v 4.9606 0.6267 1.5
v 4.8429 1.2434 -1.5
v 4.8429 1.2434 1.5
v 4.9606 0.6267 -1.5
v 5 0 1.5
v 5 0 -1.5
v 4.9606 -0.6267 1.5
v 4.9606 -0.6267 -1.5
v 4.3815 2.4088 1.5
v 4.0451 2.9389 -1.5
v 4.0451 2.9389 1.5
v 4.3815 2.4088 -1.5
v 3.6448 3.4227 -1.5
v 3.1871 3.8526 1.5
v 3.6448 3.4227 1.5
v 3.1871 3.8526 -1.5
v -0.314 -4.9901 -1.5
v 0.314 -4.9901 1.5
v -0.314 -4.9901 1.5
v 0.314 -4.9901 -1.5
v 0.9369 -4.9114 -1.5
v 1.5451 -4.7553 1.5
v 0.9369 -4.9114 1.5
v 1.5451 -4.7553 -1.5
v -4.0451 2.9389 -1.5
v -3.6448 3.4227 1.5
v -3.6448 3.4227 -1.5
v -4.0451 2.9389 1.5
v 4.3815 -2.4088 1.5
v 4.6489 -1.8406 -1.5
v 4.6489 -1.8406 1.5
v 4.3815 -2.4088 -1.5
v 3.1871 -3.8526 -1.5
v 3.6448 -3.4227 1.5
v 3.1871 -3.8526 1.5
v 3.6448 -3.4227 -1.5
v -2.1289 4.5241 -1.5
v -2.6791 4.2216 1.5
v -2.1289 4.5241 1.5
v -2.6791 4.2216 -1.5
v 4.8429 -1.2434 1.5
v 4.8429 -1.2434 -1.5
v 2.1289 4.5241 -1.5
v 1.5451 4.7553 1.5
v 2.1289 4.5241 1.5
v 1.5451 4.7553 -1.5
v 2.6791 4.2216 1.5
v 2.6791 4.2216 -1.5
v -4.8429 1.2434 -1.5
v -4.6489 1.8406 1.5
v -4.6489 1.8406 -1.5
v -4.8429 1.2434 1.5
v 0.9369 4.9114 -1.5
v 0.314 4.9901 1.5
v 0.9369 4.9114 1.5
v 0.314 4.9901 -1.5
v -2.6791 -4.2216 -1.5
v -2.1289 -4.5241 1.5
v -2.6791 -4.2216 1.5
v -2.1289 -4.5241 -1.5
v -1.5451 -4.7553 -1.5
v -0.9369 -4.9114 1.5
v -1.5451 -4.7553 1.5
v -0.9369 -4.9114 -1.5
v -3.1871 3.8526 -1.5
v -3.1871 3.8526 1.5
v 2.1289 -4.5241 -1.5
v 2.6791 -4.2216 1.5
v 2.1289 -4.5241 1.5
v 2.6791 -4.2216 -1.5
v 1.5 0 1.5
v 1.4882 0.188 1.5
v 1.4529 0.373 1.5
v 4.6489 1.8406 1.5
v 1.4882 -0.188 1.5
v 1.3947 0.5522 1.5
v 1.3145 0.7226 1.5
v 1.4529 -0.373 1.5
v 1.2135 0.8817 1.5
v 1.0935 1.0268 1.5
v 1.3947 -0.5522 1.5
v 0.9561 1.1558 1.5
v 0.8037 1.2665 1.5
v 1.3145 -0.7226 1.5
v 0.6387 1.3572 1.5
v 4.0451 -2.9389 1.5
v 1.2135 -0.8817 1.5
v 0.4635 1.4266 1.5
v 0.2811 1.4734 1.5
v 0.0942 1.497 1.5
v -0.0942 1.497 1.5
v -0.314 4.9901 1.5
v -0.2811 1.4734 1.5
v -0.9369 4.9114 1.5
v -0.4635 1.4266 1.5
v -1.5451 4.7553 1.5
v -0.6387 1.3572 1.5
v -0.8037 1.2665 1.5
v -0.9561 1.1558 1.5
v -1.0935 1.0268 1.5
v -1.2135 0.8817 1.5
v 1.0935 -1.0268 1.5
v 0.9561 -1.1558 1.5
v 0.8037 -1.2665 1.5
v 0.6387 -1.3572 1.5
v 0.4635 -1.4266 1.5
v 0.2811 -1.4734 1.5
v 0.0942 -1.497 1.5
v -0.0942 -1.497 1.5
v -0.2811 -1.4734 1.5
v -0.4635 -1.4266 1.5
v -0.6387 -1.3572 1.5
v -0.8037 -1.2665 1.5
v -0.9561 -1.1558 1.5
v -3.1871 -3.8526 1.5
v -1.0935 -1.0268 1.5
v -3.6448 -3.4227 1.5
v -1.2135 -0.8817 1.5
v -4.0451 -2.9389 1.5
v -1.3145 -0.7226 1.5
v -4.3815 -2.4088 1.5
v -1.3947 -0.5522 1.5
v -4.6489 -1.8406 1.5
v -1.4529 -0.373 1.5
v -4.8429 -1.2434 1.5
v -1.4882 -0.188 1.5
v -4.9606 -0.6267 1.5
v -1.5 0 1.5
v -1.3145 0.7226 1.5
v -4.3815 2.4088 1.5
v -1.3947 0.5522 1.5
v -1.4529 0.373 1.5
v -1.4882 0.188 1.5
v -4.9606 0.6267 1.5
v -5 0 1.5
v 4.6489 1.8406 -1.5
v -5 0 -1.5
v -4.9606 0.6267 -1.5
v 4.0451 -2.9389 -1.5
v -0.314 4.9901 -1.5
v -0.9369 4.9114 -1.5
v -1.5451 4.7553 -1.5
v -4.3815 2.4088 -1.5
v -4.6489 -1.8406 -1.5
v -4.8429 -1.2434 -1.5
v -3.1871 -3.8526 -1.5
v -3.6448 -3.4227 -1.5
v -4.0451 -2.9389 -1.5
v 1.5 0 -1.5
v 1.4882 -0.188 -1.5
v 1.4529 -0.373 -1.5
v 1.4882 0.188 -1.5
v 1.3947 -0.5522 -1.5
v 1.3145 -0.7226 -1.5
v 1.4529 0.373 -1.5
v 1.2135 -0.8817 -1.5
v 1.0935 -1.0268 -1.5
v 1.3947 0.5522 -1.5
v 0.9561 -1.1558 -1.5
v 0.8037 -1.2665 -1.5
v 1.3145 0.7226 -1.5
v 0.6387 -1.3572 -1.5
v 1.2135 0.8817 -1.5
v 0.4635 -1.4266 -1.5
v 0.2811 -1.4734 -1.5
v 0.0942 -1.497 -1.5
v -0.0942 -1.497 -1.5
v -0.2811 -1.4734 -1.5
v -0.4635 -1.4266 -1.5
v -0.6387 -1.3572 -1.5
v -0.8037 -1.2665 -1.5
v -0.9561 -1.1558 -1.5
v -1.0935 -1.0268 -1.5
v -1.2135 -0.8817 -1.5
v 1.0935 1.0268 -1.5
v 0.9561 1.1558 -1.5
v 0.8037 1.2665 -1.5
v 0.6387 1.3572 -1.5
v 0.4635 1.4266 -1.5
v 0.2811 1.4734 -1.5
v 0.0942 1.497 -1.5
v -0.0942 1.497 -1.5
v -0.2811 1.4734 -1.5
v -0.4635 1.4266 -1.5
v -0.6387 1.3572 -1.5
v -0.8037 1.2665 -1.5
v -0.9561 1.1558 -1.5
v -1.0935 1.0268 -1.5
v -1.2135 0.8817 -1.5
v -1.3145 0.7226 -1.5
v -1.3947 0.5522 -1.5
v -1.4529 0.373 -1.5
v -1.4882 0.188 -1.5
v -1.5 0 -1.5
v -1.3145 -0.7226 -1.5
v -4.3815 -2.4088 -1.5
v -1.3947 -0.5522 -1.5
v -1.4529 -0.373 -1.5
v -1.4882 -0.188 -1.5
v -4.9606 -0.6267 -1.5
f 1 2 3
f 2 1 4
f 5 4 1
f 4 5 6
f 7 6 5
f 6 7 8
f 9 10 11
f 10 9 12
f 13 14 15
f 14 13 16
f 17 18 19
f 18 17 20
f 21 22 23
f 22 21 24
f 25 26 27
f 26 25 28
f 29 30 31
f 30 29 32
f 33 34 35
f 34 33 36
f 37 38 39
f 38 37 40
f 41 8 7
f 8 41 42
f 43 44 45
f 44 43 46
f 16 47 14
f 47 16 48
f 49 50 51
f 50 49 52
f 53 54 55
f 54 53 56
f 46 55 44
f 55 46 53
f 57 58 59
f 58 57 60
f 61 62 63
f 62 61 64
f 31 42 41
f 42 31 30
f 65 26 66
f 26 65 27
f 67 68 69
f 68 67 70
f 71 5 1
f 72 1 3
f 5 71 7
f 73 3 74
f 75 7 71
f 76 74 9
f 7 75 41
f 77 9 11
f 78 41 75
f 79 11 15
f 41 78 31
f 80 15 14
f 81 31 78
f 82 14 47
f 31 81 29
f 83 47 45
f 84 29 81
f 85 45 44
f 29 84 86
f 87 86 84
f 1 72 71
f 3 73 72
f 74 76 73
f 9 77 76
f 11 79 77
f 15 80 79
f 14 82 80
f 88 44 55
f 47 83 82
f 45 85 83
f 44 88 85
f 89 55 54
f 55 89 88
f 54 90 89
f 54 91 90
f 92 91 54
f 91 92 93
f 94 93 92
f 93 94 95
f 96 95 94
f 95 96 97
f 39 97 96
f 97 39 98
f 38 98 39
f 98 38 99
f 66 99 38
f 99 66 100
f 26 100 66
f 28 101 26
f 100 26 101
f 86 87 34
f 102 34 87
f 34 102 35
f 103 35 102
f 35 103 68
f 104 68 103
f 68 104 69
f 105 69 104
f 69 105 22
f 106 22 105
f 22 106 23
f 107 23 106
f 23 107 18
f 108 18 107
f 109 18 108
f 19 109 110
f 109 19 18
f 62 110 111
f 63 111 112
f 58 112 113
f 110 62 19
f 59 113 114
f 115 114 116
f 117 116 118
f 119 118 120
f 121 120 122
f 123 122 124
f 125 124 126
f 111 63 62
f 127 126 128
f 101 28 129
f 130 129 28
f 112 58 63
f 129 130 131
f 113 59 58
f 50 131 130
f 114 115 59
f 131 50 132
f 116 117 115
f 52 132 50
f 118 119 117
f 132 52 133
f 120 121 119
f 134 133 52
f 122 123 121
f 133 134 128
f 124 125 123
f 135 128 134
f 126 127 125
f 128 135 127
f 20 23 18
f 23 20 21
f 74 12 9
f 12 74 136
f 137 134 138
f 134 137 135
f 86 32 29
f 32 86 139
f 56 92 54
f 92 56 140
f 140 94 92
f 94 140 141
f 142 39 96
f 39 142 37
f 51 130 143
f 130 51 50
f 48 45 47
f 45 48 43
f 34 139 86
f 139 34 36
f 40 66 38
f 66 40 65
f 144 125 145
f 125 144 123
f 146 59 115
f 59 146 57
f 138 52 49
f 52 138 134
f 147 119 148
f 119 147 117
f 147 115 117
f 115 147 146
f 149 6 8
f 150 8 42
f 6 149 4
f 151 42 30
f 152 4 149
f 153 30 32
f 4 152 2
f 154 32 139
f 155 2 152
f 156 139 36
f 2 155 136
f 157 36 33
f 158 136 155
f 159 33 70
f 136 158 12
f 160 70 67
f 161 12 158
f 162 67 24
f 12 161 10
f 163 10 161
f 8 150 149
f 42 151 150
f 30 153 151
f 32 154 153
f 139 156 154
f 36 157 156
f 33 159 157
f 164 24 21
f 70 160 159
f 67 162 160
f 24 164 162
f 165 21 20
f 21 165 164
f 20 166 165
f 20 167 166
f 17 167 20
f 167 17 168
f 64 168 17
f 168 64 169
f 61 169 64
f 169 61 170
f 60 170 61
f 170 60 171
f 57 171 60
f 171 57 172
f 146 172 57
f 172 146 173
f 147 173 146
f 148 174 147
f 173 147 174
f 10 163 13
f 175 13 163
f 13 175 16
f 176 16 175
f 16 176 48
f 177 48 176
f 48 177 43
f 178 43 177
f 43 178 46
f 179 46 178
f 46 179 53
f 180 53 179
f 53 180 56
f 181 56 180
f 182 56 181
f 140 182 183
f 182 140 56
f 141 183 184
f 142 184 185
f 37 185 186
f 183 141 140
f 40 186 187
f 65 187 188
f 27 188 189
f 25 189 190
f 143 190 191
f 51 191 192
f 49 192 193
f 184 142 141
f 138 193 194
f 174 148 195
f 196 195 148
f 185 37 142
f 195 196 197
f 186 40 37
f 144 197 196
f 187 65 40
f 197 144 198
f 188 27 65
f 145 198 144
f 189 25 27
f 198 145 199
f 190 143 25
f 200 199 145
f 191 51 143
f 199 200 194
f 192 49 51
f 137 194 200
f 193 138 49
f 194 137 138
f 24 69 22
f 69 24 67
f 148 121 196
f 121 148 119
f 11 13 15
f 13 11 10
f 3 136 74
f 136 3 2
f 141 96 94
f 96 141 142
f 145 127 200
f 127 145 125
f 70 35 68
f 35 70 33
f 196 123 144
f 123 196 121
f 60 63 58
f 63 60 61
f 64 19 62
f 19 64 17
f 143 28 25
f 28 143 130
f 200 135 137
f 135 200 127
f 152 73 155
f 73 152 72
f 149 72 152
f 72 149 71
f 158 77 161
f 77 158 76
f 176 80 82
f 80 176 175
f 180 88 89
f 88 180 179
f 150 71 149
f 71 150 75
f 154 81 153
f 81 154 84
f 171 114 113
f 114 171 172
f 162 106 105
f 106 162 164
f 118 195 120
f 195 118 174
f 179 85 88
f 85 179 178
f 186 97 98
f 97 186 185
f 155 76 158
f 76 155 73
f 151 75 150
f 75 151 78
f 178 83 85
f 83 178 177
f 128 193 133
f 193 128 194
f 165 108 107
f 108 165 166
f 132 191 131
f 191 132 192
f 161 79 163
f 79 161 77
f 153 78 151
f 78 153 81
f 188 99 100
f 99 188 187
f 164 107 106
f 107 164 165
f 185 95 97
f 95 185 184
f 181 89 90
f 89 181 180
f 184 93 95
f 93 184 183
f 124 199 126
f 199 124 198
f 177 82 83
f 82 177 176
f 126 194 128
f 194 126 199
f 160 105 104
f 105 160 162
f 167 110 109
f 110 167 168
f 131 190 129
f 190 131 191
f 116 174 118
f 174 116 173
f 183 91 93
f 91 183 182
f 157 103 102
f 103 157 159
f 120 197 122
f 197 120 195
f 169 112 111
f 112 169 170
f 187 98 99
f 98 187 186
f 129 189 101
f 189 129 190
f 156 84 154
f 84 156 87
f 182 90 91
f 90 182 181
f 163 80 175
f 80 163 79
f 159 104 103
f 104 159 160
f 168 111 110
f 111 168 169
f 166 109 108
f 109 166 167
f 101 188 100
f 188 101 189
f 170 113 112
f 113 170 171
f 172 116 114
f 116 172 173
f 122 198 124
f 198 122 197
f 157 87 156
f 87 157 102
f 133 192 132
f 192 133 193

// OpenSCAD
$fn = 50;


difference() {
	union() {
		translate(v = [0, 0, -1.5000000000]) {
			cylinder(h = 3, r = 5.0000000000);
		}
		translate(v = [0, 0, -1.5000000000]) {
			cylinder(h = 3, r = 3.0000000000);
		}
	}
	union() {
		translate(v = [0, 0, -50.0000000000]) {
			cylinder(h = 100, r = 1.5000000000);
		}
	}
}
